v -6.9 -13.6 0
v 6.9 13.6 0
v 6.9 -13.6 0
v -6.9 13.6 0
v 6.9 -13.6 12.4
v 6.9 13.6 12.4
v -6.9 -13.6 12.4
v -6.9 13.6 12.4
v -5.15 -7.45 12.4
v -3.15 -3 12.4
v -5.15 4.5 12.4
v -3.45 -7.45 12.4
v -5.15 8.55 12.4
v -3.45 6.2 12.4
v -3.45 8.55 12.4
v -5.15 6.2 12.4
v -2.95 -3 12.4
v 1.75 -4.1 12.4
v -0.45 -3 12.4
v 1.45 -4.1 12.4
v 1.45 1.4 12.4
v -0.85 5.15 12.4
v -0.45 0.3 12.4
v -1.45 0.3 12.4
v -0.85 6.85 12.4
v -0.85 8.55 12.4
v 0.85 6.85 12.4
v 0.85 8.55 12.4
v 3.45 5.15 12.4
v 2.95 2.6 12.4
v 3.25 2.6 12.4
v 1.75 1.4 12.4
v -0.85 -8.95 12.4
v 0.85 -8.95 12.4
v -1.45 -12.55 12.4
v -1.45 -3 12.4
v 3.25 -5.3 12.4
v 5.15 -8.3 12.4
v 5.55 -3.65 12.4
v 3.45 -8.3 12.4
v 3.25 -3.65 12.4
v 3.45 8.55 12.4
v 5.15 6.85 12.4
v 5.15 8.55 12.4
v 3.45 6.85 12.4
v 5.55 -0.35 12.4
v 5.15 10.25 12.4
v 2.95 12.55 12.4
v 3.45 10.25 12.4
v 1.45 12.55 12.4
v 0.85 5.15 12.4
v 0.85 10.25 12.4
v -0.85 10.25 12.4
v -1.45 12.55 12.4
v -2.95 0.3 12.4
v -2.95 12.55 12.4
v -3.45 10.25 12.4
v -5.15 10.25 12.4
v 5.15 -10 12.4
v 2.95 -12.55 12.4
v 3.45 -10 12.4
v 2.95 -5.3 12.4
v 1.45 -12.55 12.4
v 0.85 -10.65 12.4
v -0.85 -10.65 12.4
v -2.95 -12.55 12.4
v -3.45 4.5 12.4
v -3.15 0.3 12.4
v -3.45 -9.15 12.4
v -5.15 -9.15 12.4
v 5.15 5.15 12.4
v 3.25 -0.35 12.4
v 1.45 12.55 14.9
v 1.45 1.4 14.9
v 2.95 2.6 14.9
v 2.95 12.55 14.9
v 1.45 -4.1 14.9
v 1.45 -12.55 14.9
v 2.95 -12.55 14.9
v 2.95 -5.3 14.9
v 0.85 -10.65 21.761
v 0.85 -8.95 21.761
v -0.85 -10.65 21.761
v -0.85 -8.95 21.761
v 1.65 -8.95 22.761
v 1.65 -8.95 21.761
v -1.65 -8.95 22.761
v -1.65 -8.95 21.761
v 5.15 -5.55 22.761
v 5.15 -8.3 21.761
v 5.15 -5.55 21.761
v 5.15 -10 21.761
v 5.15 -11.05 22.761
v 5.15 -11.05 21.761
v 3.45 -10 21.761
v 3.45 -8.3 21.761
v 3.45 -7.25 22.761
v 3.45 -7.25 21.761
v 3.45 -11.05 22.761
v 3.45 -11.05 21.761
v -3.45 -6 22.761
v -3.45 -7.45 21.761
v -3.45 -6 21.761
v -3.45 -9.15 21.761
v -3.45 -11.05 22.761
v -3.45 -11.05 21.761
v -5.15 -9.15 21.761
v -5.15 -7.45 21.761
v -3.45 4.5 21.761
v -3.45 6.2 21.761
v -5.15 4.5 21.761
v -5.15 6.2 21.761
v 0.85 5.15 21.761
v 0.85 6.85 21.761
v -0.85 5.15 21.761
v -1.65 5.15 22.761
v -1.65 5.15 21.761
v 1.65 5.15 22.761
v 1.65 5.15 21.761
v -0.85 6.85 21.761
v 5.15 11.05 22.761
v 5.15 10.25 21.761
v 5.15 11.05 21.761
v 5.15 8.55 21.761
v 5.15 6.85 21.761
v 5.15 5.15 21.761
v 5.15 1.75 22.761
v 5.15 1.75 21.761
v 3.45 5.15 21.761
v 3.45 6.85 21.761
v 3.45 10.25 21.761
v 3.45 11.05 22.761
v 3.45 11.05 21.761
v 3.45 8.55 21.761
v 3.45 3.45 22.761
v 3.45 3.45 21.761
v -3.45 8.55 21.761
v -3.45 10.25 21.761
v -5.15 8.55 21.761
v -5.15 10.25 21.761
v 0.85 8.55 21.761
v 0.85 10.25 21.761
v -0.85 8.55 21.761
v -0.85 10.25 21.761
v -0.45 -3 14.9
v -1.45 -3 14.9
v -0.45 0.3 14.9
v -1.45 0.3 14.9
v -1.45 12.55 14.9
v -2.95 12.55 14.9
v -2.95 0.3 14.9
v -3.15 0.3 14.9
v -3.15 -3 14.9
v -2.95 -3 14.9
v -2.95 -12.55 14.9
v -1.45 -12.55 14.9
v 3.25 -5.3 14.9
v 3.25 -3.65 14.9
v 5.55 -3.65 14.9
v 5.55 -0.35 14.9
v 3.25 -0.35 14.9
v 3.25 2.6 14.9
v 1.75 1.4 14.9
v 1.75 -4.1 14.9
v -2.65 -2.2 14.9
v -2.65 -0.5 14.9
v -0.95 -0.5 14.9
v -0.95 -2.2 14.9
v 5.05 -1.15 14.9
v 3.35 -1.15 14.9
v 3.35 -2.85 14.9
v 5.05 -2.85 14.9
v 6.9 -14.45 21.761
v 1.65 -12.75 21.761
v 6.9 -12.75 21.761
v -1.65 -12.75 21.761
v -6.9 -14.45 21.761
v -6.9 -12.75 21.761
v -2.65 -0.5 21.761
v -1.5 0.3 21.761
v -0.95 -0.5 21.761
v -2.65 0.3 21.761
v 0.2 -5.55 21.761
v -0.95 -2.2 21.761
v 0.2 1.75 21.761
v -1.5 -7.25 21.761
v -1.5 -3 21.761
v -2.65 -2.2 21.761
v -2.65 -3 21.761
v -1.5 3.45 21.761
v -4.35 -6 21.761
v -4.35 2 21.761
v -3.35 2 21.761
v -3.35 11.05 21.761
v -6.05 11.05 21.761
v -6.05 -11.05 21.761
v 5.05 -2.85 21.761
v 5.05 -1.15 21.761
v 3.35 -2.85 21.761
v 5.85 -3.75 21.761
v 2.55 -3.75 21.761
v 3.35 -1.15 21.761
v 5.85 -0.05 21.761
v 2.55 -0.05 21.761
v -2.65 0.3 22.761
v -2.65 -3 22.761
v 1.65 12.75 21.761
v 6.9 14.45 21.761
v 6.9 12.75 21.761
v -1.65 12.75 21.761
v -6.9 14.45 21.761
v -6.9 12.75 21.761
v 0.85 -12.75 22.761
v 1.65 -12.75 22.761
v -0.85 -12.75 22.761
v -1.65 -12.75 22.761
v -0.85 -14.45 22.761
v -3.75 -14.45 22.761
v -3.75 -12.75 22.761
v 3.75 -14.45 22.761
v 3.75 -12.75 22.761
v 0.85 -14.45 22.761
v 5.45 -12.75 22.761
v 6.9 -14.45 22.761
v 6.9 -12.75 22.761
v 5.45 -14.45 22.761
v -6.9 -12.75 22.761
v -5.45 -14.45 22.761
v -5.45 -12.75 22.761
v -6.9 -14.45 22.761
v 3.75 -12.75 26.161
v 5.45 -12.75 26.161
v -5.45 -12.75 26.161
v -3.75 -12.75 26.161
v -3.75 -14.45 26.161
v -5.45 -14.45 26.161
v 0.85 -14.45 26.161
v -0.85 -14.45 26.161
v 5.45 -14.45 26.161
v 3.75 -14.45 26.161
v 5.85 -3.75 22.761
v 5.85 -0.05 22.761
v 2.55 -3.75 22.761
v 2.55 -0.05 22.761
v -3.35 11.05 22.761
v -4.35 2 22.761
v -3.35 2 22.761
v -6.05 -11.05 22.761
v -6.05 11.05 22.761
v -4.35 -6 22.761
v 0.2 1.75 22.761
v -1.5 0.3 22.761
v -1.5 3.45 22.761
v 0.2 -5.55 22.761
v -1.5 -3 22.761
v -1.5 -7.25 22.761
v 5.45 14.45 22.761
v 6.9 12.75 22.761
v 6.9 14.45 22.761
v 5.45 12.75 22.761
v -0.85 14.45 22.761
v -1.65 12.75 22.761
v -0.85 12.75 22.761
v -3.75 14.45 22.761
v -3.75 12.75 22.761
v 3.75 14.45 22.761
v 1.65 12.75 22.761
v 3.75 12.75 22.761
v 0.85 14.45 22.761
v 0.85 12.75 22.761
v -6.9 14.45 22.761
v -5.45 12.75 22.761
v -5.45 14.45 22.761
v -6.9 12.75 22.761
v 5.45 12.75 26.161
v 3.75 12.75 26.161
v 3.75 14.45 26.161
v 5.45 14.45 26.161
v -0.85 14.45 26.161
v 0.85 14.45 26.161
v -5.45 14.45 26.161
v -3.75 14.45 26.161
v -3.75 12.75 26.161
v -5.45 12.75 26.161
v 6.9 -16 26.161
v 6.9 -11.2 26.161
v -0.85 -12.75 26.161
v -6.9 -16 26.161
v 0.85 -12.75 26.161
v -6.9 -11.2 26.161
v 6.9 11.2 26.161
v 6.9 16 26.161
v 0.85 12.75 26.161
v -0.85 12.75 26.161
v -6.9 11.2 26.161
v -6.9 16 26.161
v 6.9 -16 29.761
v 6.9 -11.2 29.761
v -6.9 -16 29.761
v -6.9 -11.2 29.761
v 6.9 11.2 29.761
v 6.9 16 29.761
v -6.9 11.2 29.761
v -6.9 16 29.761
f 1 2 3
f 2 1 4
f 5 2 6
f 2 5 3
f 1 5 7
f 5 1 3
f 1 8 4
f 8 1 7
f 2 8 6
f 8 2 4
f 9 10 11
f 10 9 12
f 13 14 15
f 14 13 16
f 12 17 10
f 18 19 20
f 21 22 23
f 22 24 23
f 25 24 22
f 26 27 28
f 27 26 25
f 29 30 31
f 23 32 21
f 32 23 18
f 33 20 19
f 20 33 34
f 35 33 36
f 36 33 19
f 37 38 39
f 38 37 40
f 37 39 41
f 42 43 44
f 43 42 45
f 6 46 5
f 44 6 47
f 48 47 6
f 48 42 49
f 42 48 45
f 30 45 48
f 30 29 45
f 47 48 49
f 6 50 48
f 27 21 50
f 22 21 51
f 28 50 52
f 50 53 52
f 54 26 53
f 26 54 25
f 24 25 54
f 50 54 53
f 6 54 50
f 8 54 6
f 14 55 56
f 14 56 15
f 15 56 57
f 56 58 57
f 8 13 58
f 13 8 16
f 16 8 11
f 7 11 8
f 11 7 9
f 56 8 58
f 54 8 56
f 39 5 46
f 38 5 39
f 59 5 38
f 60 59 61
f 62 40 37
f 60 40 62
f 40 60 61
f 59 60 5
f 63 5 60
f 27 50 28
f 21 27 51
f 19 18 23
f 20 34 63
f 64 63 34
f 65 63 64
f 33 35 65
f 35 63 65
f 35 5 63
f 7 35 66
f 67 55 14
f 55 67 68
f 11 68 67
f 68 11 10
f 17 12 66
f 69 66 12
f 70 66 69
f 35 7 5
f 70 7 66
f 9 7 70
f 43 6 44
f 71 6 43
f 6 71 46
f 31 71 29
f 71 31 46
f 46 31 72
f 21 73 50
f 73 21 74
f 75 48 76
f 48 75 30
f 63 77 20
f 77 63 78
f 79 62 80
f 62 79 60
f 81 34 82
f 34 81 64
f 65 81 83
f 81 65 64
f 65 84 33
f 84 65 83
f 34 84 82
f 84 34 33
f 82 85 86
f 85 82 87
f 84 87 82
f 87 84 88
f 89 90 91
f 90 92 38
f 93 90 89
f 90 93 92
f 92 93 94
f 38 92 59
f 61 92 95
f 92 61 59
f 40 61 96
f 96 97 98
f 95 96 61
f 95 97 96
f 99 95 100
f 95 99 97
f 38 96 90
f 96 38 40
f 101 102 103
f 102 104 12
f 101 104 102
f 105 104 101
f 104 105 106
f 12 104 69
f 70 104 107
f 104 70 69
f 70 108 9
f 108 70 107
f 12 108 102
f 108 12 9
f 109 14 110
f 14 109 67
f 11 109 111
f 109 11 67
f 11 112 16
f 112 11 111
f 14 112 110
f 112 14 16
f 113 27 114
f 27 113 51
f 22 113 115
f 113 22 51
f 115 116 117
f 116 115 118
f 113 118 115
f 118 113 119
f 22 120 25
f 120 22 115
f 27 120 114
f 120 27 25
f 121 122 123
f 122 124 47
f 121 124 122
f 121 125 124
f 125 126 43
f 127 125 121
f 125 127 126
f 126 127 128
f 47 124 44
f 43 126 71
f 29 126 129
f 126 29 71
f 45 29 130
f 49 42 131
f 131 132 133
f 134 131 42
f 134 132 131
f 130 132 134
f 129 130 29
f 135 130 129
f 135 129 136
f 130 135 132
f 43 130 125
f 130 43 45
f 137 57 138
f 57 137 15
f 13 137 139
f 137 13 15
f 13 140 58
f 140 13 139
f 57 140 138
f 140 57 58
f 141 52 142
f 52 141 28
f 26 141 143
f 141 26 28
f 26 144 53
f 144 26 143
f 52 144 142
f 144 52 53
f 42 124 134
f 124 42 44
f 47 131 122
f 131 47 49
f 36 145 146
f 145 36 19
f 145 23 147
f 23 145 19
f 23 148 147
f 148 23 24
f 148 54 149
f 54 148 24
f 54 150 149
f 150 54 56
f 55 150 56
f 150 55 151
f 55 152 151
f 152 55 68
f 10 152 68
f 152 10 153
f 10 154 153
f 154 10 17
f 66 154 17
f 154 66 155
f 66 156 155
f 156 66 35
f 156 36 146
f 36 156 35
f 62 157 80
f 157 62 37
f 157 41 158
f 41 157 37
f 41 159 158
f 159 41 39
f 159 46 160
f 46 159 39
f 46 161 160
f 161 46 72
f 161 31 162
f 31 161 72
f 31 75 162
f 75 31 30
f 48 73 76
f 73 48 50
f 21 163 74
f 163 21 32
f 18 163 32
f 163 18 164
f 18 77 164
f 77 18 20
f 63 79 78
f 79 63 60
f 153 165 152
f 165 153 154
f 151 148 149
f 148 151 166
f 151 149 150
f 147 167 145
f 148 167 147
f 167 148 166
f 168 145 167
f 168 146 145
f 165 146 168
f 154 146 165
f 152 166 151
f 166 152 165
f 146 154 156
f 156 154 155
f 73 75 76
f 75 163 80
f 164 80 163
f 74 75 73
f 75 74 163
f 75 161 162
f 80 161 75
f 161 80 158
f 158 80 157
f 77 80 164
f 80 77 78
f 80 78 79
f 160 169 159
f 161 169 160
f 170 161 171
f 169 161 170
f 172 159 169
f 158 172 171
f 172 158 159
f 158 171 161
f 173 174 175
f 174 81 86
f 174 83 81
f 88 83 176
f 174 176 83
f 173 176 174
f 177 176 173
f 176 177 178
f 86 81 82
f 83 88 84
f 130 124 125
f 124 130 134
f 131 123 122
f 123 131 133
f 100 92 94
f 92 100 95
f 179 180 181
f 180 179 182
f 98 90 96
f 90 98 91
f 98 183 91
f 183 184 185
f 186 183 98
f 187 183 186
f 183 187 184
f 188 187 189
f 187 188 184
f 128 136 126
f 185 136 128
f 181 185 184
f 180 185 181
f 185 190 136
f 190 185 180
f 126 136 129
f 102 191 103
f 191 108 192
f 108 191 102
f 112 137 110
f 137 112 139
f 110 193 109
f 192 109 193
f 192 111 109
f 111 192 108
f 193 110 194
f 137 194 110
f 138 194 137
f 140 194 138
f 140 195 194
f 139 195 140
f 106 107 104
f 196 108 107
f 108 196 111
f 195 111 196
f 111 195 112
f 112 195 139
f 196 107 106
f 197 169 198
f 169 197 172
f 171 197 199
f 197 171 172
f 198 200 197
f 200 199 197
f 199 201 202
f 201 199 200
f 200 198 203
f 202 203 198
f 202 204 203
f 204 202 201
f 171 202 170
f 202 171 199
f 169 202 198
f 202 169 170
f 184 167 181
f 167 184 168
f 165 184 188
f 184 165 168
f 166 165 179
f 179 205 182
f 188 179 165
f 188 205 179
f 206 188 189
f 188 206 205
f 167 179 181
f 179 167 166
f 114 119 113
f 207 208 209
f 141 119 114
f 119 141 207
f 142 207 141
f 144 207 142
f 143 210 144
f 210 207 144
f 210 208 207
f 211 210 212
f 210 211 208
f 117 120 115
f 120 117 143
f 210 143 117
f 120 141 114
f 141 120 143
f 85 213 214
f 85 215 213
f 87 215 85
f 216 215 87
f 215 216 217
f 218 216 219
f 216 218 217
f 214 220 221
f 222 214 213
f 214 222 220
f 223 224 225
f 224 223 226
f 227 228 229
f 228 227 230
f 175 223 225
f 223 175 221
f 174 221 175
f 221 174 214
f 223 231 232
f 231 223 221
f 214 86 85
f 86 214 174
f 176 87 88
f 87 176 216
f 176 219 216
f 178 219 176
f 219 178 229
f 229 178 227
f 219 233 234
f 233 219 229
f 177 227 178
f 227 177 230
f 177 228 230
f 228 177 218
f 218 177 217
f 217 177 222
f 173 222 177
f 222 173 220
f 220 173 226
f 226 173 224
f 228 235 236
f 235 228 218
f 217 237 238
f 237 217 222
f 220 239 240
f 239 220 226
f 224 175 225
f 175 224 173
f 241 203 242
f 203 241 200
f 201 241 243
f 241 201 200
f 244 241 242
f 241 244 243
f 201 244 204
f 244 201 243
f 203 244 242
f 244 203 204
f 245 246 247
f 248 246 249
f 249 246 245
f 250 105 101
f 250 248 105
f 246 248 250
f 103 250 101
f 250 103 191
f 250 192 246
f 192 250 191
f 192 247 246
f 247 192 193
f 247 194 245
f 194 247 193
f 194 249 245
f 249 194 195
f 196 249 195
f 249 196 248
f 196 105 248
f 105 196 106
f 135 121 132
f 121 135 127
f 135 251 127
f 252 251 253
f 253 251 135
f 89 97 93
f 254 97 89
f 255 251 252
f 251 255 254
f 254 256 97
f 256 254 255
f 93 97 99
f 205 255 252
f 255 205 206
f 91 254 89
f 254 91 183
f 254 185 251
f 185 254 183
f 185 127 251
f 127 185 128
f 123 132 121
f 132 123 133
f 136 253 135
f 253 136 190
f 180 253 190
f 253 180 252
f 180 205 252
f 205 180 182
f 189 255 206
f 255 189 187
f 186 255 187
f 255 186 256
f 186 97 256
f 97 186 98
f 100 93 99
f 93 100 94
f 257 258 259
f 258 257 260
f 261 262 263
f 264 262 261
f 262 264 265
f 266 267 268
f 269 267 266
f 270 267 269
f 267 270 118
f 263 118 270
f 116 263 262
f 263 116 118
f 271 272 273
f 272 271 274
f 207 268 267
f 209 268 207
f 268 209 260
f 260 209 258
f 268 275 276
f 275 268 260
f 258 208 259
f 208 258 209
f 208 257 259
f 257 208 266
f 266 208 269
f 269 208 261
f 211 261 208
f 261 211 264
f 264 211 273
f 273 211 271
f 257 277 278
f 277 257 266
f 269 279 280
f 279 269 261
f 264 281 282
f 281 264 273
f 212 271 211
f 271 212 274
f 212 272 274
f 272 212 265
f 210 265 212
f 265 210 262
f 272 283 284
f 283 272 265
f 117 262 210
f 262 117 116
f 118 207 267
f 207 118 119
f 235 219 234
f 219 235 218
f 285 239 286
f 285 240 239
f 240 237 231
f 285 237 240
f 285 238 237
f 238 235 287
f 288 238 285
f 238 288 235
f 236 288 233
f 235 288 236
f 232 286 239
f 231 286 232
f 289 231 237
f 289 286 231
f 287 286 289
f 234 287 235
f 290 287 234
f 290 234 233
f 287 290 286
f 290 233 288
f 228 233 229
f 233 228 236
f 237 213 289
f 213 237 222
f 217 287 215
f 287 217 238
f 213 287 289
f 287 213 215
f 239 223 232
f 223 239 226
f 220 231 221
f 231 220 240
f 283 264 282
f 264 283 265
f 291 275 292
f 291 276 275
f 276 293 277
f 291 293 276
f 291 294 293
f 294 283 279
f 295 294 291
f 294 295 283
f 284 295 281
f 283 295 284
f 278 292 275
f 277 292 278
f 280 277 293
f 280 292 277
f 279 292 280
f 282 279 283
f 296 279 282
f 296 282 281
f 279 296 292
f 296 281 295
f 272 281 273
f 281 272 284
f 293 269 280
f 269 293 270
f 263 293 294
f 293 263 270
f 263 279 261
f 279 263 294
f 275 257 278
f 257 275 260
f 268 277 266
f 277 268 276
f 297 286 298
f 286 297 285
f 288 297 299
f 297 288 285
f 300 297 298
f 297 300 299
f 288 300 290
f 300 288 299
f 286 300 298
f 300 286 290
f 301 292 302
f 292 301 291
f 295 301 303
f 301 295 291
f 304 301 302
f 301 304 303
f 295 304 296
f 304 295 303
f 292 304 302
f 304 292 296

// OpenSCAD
// Generated by SolidPython 0.4.2 on 2020-09-29 23:20:17
//!OpenSCAD

scale(v = 0.0100000000) {
	translate(v = [-690, -1360, 0]) {
		union() {
			color(c = [0.4000000000, 0.4000000000, 0.4000000000]) {
				translate(v = [0, 0, 0]) {
					linear_extrude(height = 1000.0000000000) {
						polygon(paths = [[0, 1, 2, 3]], points = [[0, 0], [0, 2720], [1380, 2720], [1380, 0]]);
					}
				}
			}
			color(c = [0.2000000000, 0.6000000000, 0.2000000000]) {
				translate(v = [0, 0, 1000.0000000000]) {
					linear_extrude(height = 120.0000000000) {
						polygon(paths = [[0, 1, 2, 3]], points = [[0, 1305], [0, 2720], [1380, 2720], [1380, 1305]]);
					}
				}
			}
			color(c = [0.4000000000, 0.4000000000, 0.4000000000]) {
				translate(v = [0, 0, 1000.0000000000]) {
					linear_extrude(height = 120.0000000000) {
						polygon(paths = [[0, 1, 2, 3]], points = [[0, 0], [0, 1305], [1380, 1305], [1380, 0]]);
					}
				}
			}
			color(c = [0.9000000000, 0.6000000000, 0.6000000000]) {
				translate(v = [0, 0, 1120.0000000000]) {
					linear_extrude(height = 120.0000000000) {
						polygon(paths = [[0, 1, 2, 3]], points = [[135, 1695], [135, 2485], [395, 2485], [395, 1695]]);
					}
				}
			}
			color(c = [0.9000000000, 0.6000000000, 0.6000000000]) {
				translate(v = [0, 0, 1120.0000000000]) {
					linear_extrude(height = 120.0000000000) {
						polygon(paths = [[0, 1, 2, 3]], points = [[545, 1695], [545, 2485], [835, 2485], [835, 1695]]);
					}
				}
			}
			color(c = [0.9000000000, 0.6000000000, 0.6000000000]) {
				translate(v = [0, 0, 1120.0000000000]) {
					linear_extrude(height = 120.0000000000) {
						polygon(paths = [[0, 1, 2, 3]], points = [[985, 1695], [985, 2485], [1245, 2485], [1245, 1695]]);
					}
				}
			}
			color(c = [0.9000000000, 0.6000000000, 0.9000000000]) {
				translate(v = [0, 0, 1120.0000000000]) {
					linear_extrude(height = 120.0000000000) {
						polygon(paths = [[0, 1, 2, 3]], points = [[135, 235], [135, 755], [395, 755], [395, 235]]);
					}
				}
			}
			color(c = [0.9000000000, 0.6000000000, 0.9000000000]) {
				translate(v = [0, 0, 1120.0000000000]) {
					linear_extrude(height = 120.0000000000) {
						polygon(paths = [[0, 1, 2, 3]], points = [[545, 235], [545, 755], [835, 755], [835, 235]]);
					}
				}
			}
			color(c = [0.9000000000, 0.6000000000, 0.9000000000]) {
				translate(v = [0, 0, 1120.0000000000]) {
					linear_extrude(height = 120.0000000000) {
						polygon(paths = [[0, 1, 2, 3]], points = [[985, 235], [985, 755], [1245, 755], [1245, 235]]);
					}
				}
			}
			color(c = [0.2000000000, 0.6000000000, 0.2000000000]) {
				translate(v = [0, 0, 1120.0000000000]) {
					linear_extrude(height = 120.0000000000) {
						difference() {
							polygon(paths = [[0, 1, 2, 3]], points = [[0, 1305], [0, 2720], [1380, 2720], [1380, 1305]]);
							polygon(paths = [[0, 1, 2, 3]], points = [[135, 1695], [395, 1695], [395, 2485], [135, 2485]]);
							polygon(paths = [[0, 1, 2, 3]], points = [[545, 1695], [835, 1695], [835, 2485], [545, 2485]]);
							polygon(paths = [[0, 1, 2, 3]], points = [[985, 1695], [1245, 1695], [1245, 2485], [985, 2485]]);
						}
					}
				}
			}
			color(c = [0.4000000000, 0.4000000000, 0.4000000000]) {
				translate(v = [0, 0, 1120.0000000000]) {
					linear_extrude(height = 120.0000000000) {
						difference() {
							polygon(paths = [[0, 1, 2, 3]], points = [[0, 0], [0, 1305], [1380, 1305], [1380, 0]]);
							polygon(paths = [[0, 1, 2, 3]], points = [[135, 235], [395, 235], [395, 755], [135, 755]]);
							polygon(paths = [[0, 1, 2, 3]], points = [[545, 235], [835, 235], [835, 755], [545, 755]]);
							polygon(paths = [[0, 1, 2, 3]], points = [[985, 235], [1245, 235], [1245, 755], [985, 755]]);
						}
					}
				}
			}
			color(c = [0.1000000000, 0.1000000000, 0.1000000000]) {
				translate(v = [0, 0, 1240.0000000000]) {
					linear_extrude(height = 70.0000000000) {
						polygon(paths = [[0, 1, 2, 3]], points = [[605, 295], [605, 465], [775, 465], [775, 295]]);
					}
				}
			}
			color(c = [0.1000000000, 0.1000000000, 0.1000000000]) {
				translate(v = [0, 0, 1240.0000000000]) {
					linear_extrude(height = 70.0000000000) {
						polygon(paths = [[0, 1, 2, 3]], points = [[1035, 360], [1035, 530], [1205, 530], [1205, 360]]);
					}
				}
			}
			color(c = [0.1000000000, 0.1000000000, 0.1000000000]) {
				translate(v = [0, 0, 1240.0000000000]) {
					linear_extrude(height = 70.0000000000) {
						polygon(paths = [[0, 1, 2, 3]], points = [[175, 445], [175, 615], [345, 615], [345, 445]]);
					}
				}
			}
			color(c = [0.1000000000, 0.1000000000, 0.1000000000]) {
				translate(v = [0, 0, 1240.0000000000]) {
					linear_extrude(height = 70.0000000000) {
						polygon(paths = [[0, 1, 2, 3]], points = [[175, 1810], [175, 1980], [345, 1980], [345, 1810]]);
					}
				}
			}
			color(c = [0.1000000000, 0.1000000000, 0.1000000000]) {
				translate(v = [0, 0, 1240.0000000000]) {
					linear_extrude(height = 70.0000000000) {
						polygon(paths = [[0, 1, 2, 3]], points = [[605, 1875], [605, 2045], [775, 2045], [775, 1875]]);
					}
				}
			}
			color(c = [0.1000000000, 0.1000000000, 0.1000000000]) {
				translate(v = [0, 0, 1240.0000000000]) {
					linear_extrude(height = 70.0000000000) {
						polygon(paths = [[0, 1, 2, 3]], points = [[1035, 1875], [1035, 2045], [1205, 2045], [1205, 1875]]);
					}
				}
			}
			color(c = [0.1000000000, 0.1000000000, 0.1000000000]) {
				translate(v = [0, 0, 1240.0000000000]) {
					linear_extrude(height = 70.0000000000) {
						polygon(paths = [[0, 1, 2, 3]], points = [[175, 2215], [175, 2385], [345, 2385], [345, 2215]]);
					}
				}
			}
			color(c = [0.1000000000, 0.1000000000, 0.1000000000]) {
				translate(v = [0, 0, 1240.0000000000]) {
					linear_extrude(height = 70.0000000000) {
						polygon(paths = [[0, 1, 2, 3]], points = [[605, 2215], [605, 2385], [775, 2385], [775, 2215]]);
					}
				}
			}
			color(c = [0.1000000000, 0.1000000000, 0.1000000000]) {
				translate(v = [0, 0, 1240.0000000000]) {
					linear_extrude(height = 70.0000000000) {
						polygon(paths = [[0, 1, 2, 3]], points = [[1035, 2215], [1035, 2385], [1205, 2385], [1205, 2215]]);
					}
				}
			}
			color(c = [1.0000000000, 1.0000000000, 1.0000000000]) {
				translate(v = [0, 0, 1240.0000000000]) {
					linear_extrude(height = 70.0000000000) {
						polygon(paths = [[0, 1, 2, 3, 4, 5, 6, 7, 8, 9, 10, 11]], points = [[395, 105], [395, 1060], [375, 1060], [375, 1390], [395, 1390], [395, 2615], [545, 2615], [545, 1390], [645, 1390], [645, 1060], [545, 1060], [545, 105]]);
					}
				}
			}
			color(c = [1.0000000000, 1.0000000000, 1.0000000000]) {
				translate(v = [0, 0, 1240.0000000000]) {
					linear_extrude(height = 70.0000000000) {
						polygon(paths = [[0, 1, 2, 3, 4, 5, 6, 7, 8, 9, 10, 11, 12, 13, 14, 15]], points = [[835, 105], [835, 950], [865, 950], [865, 1500], [835, 1500], [835, 2615], [985, 2615], [985, 1620], [1015, 1620], [1015, 1325], [1245, 1325], [1245, 995], [1015, 995], [1015, 830], [985, 830], [985, 105]]);
					}
				}
			}
			color(c = [0.1000000000, 0.1000000000, 0.1000000000]) {
				translate(v = [0, 0, 1310.0000000000]) {
					linear_extrude(height = 180.0000000000) {
						polygon(paths = [[0, 1, 2, 3]], points = [[605, 295], [605, 465], [775, 465], [775, 295]]);
					}
				}
			}
			color(c = [0.1000000000, 0.1000000000, 0.1000000000]) {
				translate(v = [0, 0, 1310.0000000000]) {
					linear_extrude(height = 180.0000000000) {
						polygon(paths = [[0, 1, 2, 3]], points = [[1035, 360], [1035, 530], [1205, 530], [1205, 360]]);
					}
				}
			}
			color(c = [0.1000000000, 0.1000000000, 0.1000000000]) {
				translate(v = [0, 0, 1310.0000000000]) {
					linear_extrude(height = 180.0000000000) {
						polygon(paths = [[0, 1, 2, 3]], points = [[175, 445], [175, 615], [345, 615], [345, 445]]);
					}
				}
			}
			color(c = [0.1000000000, 0.1000000000, 0.1000000000]) {
				translate(v = [0, 0, 1310.0000000000]) {
					linear_extrude(height = 180.0000000000) {
						polygon(paths = [[0, 1, 2, 3]], points = [[175, 1810], [175, 1980], [345, 1980], [345, 1810]]);
					}
				}
			}
			color(c = [0.1000000000, 0.1000000000, 0.1000000000]) {
				translate(v = [0, 0, 1310.0000000000]) {
					linear_extrude(height = 180.0000000000) {
						polygon(paths = [[0, 1, 2, 3]], points = [[605, 1875], [605, 2045], [775, 2045], [775, 1875]]);
					}
				}
			}
			color(c = [0.1000000000, 0.1000000000, 0.1000000000]) {
				translate(v = [0, 0, 1310.0000000000]) {
					linear_extrude(height = 180.0000000000) {
						polygon(paths = [[0, 1, 2, 3]], points = [[1035, 1875], [1035, 2045], [1205, 2045], [1205, 1875]]);
					}
				}
			}
			color(c = [0.1000000000, 0.1000000000, 0.1000000000]) {
				translate(v = [0, 0, 1310.0000000000]) {
					linear_extrude(height = 180.0000000000) {
						polygon(paths = [[0, 1, 2, 3]], points = [[175, 2215], [175, 2385], [345, 2385], [345, 2215]]);
					}
				}
			}
			color(c = [0.1000000000, 0.1000000000, 0.1000000000]) {
				translate(v = [0, 0, 1310.0000000000]) {
					linear_extrude(height = 180.0000000000) {
						polygon(paths = [[0, 1, 2, 3]], points = [[605, 2215], [605, 2385], [775, 2385], [775, 2215]]);
					}
				}
			}
			color(c = [0.1000000000, 0.1000000000, 0.1000000000]) {
				translate(v = [0, 0, 1310.0000000000]) {
					linear_extrude(height = 180.0000000000) {
						polygon(paths = [[0, 1, 2, 3]], points = [[1035, 2215], [1035, 2385], [1205, 2385], [1205, 2215]]);
					}
				}
			}
			color(c = [0.7000000000, 0, 0]) {
				translate(v = [0, 0, 1310.0000000000]) {
					linear_extrude(height = 180.0000000000) {
						polygon(paths = [[0, 1, 2, 3, 4, 5, 6, 7, 8, 9, 10, 11]], points = [[395, 105], [395, 1060], [375, 1060], [375, 1390], [395, 1390], [395, 2615], [545, 2615], [545, 1390], [645, 1390], [645, 1060], [545, 1060], [545, 105]]);
					}
				}
			}
			color(c = [0.7000000000, 0, 0]) {
				translate(v = [0, 0, 1310.0000000000]) {
					linear_extrude(height = 180.0000000000) {
						polygon(paths = [[0, 1, 2, 3, 4, 5, 6, 7, 8, 9, 10, 11, 12, 13, 14, 15]], points = [[835, 105], [835, 950], [865, 950], [865, 1500], [835, 1500], [835, 2615], [985, 2615], [985, 1620], [1015, 1620], [1015, 1325], [1245, 1325], [1245, 995], [1015, 995], [1015, 830], [985, 830], [985, 105]]);
					}
				}
			}
			color(c = [0.1000000000, 0.1000000000, 0.1000000000]) {
				translate(v = [0, 0, 1490.0000000000]) {
					linear_extrude(height = 686.1000000000) {
						polygon(paths = [[0, 1, 2, 3]], points = [[605, 295], [605, 465], [775, 465], [775, 295]]);
					}
				}
			}
			color(c = [0.1000000000, 0.1000000000, 0.1000000000]) {
				translate(v = [0, 0, 1490.0000000000]) {
					linear_extrude(height = 686.1000000000) {
						polygon(paths = [[0, 1, 2, 3]], points = [[1035, 360], [1035, 530], [1205, 530], [1205, 360]]);
					}
				}
			}
			color(c = [0.1000000000, 0.1000000000, 0.1000000000]) {
				translate(v = [0, 0, 1490.0000000000]) {
					linear_extrude(height = 686.1000000000) {
						polygon(paths = [[0, 1, 2, 3]], points = [[175, 445], [175, 615], [345, 615], [345, 445]]);
					}
				}
			}
			color(c = [0.1000000000, 0.1000000000, 0.1000000000]) {
				translate(v = [0, 0, 1490.0000000000]) {
					linear_extrude(height = 686.1000000000) {
						polygon(paths = [[0, 1, 2, 3]], points = [[1025, 1075], [1025, 1245], [1195, 1245], [1195, 1075]]);
					}
				}
			}
			color(c = [0.1000000000, 0.1000000000, 0.1000000000]) {
				translate(v = [0, 0, 1490.0000000000]) {
					linear_extrude(height = 686.1000000000) {
						polygon(paths = [[0, 1, 2, 3]], points = [[425, 1140], [425, 1310], [595, 1310], [595, 1140]]);
					}
				}
			}
			color(c = [0.1000000000, 0.1000000000, 0.1000000000]) {
				translate(v = [0, 0, 1490.0000000000]) {
					linear_extrude(height = 686.1000000000) {
						polygon(paths = [[0, 1, 2, 3]], points = [[175, 1810], [175, 1980], [345, 1980], [345, 1810]]);
					}
				}
			}
			color(c = [0.1000000000, 0.1000000000, 0.1000000000]) {
				translate(v = [0, 0, 1490.0000000000]) {
					linear_extrude(height = 686.1000000000) {
						polygon(paths = [[0, 1, 2, 3]], points = [[605, 1875], [605, 2045], [775, 2045], [775, 1875]]);
					}
				}
			}
			color(c = [0.1000000000, 0.1000000000, 0.1000000000]) {
				translate(v = [0, 0, 1490.0000000000]) {
					linear_extrude(height = 686.1000000000) {
						polygon(paths = [[0, 1, 2, 3]], points = [[1035, 1875], [1035, 2045], [1205, 2045], [1205, 1875]]);
					}
				}
			}
			color(c = [0.1000000000, 0.1000000000, 0.1000000000]) {
				translate(v = [0, 0, 1490.0000000000]) {
					linear_extrude(height = 686.1000000000) {
						polygon(paths = [[0, 1, 2, 3]], points = [[175, 2215], [175, 2385], [345, 2385], [345, 2215]]);
					}
				}
			}
			color(c = [0.1000000000, 0.1000000000, 0.1000000000]) {
				translate(v = [0, 0, 1490.0000000000]) {
					linear_extrude(height = 686.1000000000) {
						polygon(paths = [[0, 1, 2, 3]], points = [[605, 2215], [605, 2385], [775, 2385], [775, 2215]]);
					}
				}
			}
			color(c = [0.1000000000, 0.1000000000, 0.1000000000]) {
				translate(v = [0, 0, 1490.0000000000]) {
					linear_extrude(height = 686.1000000000) {
						polygon(paths = [[0, 1, 2, 3]], points = [[1035, 2215], [1035, 2385], [1205, 2385], [1205, 2215]]);
					}
				}
			}
			color(c = [0.9000000000, 0.6000000000, 0.6000000000]) {
				translate(v = [0, 0, 2176.1000000000]) {
					linear_extrude(height = 100.0000000000) {
						polygon(paths = [[0, 1, 2, 3, 4, 5, 6, 7]], points = [[0, -85], [0, 85], [525, 85], [525, 465], [855, 465], [855, 85], [1380, 85], [1380, -85]]);
					}
				}
			}
			color(c = [0.9000000000, 0.6000000000, 0.6000000000]) {
				translate(v = [0, 0, 2176.1000000000]) {
					linear_extrude(height = 100.0000000000) {
						polygon(paths = [[0, 1, 2, 3]], points = [[945, 985], [945, 1355], [1275, 1355], [1275, 985]]);
					}
				}
			}
			color(c = [0.9000000000, 0.6000000000, 0.6000000000]) {
				translate(v = [0, 0, 2176.1000000000]) {
					linear_extrude(height = 100.0000000000) {
						polygon(paths = [[0, 1, 2, 3, 4, 5, 6, 7]], points = [[85, 255], [85, 2465], [355, 2465], [355, 1560], [255, 1560], [255, 760], [345, 760], [345, 255]]);
					}
				}
			}
			color(c = [0.9000000000, 0.6000000000, 0.6000000000]) {
				translate(v = [0, 0, 2176.1000000000]) {
					linear_extrude(height = 100.0000000000) {
						polygon(paths = [[0, 1, 2, 3, 4, 5, 6, 7, 8, 9, 10, 11, 12, 13, 14, 15]], points = [[1035, 255], [1035, 635], [540, 635], [540, 1060], [425, 1060], [425, 1390], [540, 1390], [540, 1705], [1035, 1705], [1035, 2465], [1205, 2465], [1205, 1535], [710, 1535], [710, 805], [1205, 805], [1205, 255]]);
					}
				}
			}
			color(c = [0.9000000000, 0.6000000000, 0.6000000000]) {
				translate(v = [0, 0, 2176.1000000000]) {
					linear_extrude(height = 100.0000000000) {
						polygon(paths = [[0, 1, 2, 3, 4, 5, 6, 7]], points = [[525, 1875], [525, 2635], [0, 2635], [0, 2805], [1380, 2805], [1380, 2635], [855, 2635], [855, 1875]]);
					}
				}
			}
			color(c = [0.5000000000, 0.5000000000, 0.5000000000]) {
				translate(v = [0, 0, 2276.1000000000]) {
					linear_extrude(height = 340.0000000000) {
						polygon(paths = [[0, 1, 2, 3]], points = [[145, -85], [145, 85], [315, 85], [315, -85]]);
					}
				}
			}
			color(c = [0.5000000000, 0.5000000000, 0.5000000000]) {
				translate(v = [0, 0, 2276.1000000000]) {
					linear_extrude(height = 340.0000000000) {
						polygon(paths = [[0, 1, 2, 3]], points = [[605, -85], [605, 85], [775, 85], [775, -85]]);
					}
				}
			}
			color(c = [0.5000000000, 0.5000000000, 0.5000000000]) {
				translate(v = [0, 0, 2276.1000000000]) {
					linear_extrude(height = 340.0000000000) {
						polygon(paths = [[0, 1, 2, 3]], points = [[1065, -85], [1065, 85], [1235, 85], [1235, -85]]);
					}
				}
			}
			color(c = [0.5000000000, 0.5000000000, 0.5000000000]) {
				translate(v = [0, 0, 2276.1000000000]) {
					linear_extrude(height = 340.0000000000) {
						polygon(paths = [[0, 1, 2, 3]], points = [[145, 2635], [145, 2805], [315, 2805], [315, 2635]]);
					}
				}
			}
			color(c = [0.5000000000, 0.5000000000, 0.5000000000]) {
				translate(v = [0, 0, 2276.1000000000]) {
					linear_extrude(height = 340.0000000000) {
						polygon(paths = [[0, 1, 2, 3]], points = [[605, 2635], [605, 2805], [775, 2805], [775, 2635]]);
					}
				}
			}
			color(c = [0.5000000000, 0.5000000000, 0.5000000000]) {
				translate(v = [0, 0, 2276.1000000000]) {
					linear_extrude(height = 340.0000000000) {
						polygon(paths = [[0, 1, 2, 3]], points = [[1065, 2635], [1065, 2805], [1235, 2805], [1235, 2635]]);
					}
				}
			}
			color(c = [0.3000000000, 0.3000000000, 1]) {
				translate(v = [0, 0, 2616.1000000000]) {
					linear_extrude(height = 360.0000000000) {
						polygon(paths = [[0, 1, 2, 3]], points = [[0, -240], [0, 240], [1380, 240], [1380, -240]]);
					}
				}
			}
			color(c = [0.3000000000, 0.3000000000, 1]) {
				translate(v = [0, 0, 2616.1000000000]) {
					linear_extrude(height = 360.0000000000) {
						polygon(paths = [[0, 1, 2, 3]], points = [[0, 2480], [0, 2960], [1380, 2960], [1380, 2480]]);
					}
				}
			}
		}
	}
}
